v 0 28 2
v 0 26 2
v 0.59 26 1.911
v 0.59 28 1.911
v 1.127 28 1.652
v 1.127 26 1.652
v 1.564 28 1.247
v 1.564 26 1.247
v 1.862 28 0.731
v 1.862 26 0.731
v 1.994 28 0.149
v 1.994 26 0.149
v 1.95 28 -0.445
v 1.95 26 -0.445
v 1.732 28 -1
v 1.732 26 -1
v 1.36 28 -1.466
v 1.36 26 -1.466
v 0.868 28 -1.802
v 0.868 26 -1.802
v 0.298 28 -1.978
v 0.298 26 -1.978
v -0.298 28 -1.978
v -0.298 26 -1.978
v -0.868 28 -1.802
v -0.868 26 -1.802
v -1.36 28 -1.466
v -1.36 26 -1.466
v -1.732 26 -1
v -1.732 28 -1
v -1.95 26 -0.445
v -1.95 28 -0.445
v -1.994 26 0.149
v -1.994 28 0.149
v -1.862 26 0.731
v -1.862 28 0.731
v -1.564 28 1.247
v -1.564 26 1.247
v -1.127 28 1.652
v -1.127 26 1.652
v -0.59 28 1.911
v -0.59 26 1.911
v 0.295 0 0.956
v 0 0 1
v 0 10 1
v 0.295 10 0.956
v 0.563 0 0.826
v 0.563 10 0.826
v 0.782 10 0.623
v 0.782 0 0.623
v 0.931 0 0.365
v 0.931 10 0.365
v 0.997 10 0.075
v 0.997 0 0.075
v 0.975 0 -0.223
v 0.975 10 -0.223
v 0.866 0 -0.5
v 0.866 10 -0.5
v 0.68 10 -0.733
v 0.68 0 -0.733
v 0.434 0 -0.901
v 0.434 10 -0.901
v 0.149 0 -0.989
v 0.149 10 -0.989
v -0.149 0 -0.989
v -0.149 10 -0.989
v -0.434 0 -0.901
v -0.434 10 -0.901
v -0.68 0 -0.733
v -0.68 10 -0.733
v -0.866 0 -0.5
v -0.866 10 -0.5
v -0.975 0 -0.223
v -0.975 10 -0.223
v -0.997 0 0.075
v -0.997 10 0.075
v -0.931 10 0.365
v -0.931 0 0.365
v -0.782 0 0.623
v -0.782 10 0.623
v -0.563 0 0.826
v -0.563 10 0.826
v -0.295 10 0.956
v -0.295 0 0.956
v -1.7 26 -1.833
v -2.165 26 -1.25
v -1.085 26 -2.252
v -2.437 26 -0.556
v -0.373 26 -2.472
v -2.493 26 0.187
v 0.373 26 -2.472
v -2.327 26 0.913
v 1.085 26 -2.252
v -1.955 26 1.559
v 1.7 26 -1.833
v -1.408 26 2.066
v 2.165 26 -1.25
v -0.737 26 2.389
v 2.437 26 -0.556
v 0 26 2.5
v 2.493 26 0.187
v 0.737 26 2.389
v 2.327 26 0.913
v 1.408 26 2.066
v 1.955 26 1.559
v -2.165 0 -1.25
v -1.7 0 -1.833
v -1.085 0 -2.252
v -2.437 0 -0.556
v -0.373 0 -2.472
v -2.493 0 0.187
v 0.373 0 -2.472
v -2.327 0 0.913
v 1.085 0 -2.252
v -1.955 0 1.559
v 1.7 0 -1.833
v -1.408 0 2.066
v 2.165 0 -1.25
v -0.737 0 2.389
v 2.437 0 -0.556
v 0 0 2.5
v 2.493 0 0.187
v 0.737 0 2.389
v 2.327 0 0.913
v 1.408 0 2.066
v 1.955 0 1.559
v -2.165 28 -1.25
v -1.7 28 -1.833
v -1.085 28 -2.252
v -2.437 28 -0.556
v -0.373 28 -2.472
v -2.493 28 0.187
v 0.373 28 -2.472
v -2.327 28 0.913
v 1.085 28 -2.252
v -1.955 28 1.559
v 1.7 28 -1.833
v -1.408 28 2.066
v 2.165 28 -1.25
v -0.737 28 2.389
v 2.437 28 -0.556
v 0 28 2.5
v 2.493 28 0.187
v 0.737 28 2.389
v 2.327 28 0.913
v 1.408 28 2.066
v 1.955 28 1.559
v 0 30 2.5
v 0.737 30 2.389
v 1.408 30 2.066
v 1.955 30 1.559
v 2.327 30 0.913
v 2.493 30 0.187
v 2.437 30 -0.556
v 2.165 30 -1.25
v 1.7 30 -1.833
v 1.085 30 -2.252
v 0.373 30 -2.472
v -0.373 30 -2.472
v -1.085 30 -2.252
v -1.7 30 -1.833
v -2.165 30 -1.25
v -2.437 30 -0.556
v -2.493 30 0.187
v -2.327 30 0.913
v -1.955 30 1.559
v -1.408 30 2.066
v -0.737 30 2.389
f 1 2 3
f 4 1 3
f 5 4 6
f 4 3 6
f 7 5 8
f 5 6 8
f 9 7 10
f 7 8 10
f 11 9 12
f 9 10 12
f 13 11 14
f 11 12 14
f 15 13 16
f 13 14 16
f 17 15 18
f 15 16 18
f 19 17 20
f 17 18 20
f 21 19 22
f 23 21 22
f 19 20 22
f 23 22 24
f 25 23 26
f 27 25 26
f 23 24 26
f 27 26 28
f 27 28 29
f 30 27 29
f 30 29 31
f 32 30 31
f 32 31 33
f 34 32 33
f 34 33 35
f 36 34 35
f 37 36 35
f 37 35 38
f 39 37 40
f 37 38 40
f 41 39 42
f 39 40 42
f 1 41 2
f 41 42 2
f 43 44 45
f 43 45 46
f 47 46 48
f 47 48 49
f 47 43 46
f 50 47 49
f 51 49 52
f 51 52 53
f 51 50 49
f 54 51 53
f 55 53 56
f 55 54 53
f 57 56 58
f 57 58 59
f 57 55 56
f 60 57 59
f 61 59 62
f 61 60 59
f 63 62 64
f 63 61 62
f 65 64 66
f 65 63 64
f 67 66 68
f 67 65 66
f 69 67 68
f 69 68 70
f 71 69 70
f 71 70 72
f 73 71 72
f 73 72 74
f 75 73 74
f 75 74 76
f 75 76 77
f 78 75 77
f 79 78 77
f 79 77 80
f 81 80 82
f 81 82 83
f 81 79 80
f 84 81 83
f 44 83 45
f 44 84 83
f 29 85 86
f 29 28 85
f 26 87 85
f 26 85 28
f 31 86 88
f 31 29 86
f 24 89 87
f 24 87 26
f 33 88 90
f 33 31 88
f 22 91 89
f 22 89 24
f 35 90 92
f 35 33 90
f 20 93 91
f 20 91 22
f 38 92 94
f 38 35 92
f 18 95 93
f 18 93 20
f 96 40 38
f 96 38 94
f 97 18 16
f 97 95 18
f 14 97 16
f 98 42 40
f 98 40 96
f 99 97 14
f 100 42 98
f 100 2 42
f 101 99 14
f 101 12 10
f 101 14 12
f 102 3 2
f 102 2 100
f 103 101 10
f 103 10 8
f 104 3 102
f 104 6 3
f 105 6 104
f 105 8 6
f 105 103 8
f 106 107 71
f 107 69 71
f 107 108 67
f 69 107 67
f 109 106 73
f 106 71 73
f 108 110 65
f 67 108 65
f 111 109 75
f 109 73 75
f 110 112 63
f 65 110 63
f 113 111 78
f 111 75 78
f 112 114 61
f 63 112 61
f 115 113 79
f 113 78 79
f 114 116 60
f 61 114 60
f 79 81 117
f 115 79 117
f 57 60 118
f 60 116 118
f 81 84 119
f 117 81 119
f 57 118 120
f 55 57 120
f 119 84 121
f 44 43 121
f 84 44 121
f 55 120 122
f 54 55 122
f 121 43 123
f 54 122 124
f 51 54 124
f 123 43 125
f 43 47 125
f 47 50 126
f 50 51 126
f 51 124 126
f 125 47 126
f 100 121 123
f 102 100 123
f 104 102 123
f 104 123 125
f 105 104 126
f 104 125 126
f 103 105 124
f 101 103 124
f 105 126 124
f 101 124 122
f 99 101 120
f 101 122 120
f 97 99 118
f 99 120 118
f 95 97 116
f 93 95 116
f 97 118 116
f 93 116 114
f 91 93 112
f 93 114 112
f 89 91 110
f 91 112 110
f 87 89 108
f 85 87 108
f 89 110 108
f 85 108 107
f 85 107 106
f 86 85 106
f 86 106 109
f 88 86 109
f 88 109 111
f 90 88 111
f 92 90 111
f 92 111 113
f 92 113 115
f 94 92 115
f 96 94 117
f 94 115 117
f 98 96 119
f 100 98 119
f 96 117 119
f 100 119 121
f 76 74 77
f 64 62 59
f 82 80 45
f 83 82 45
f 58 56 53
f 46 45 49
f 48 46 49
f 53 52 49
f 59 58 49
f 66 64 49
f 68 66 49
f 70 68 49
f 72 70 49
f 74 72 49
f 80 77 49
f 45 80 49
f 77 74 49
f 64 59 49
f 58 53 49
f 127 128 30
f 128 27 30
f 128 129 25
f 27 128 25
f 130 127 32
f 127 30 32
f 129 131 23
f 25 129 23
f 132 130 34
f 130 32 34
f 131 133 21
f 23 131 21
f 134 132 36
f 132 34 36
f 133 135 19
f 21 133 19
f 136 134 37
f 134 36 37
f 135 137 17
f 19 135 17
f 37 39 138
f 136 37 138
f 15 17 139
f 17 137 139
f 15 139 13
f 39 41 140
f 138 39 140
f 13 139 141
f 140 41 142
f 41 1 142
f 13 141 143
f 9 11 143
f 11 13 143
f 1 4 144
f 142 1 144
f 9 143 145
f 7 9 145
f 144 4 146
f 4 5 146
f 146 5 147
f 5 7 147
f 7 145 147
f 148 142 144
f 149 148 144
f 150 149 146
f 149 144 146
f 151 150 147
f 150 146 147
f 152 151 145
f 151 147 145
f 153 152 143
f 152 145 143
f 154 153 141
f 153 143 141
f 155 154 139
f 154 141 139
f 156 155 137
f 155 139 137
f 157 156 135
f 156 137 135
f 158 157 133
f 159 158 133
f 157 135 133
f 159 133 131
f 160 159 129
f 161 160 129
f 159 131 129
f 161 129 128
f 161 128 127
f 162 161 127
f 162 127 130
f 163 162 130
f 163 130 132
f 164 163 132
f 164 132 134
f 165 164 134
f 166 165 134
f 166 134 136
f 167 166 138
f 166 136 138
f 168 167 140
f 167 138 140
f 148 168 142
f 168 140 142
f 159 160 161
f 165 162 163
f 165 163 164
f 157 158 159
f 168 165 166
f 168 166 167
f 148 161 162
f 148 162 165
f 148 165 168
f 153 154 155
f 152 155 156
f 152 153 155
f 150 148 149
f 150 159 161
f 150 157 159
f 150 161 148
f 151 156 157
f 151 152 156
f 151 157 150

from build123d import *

# Parameters (mm, degrees)
SKETCH1_R           = 2.5
BOSS_EXTRUDE1_DEPTH = 26
SKETCH1_5_R         = 1
CUT_EXTRUDE1_DEPTH  = 10
SKETCH3_R           = 2
BOSS_EXTRUDE2_DEPTH = 2
SKETCH4_R           = 2.5
BOSS_EXTRUDE3_DEPTH = 2


with BuildPart() as part:
    # Sketch1 → Boss-Extrude1 (new body)
    with BuildSketch(Plane(origin=(0, 0, 0), x_dir=(1, 0, 0), z_dir=(0, 1, 0))):
        Circle(SKETCH1_R)
    extrude(amount=BOSS_EXTRUDE1_DEPTH)

    # Sketch1<5> → Cut-Extrude1 (cut)
    with BuildSketch(Plane(origin=(0, 0, 0), x_dir=(1, 0, 0), z_dir=(0, 1, 0))):
        Circle(SKETCH1_5_R)
    extrude(amount=CUT_EXTRUDE1_DEPTH, mode=Mode.SUBTRACT)

    # Sketch3 → Boss-Extrude2 (add)
    with BuildSketch(Plane(origin=(0, 26, 0), x_dir=(1, 0, 0), z_dir=(0, 1, 0))):
        Circle(SKETCH3_R)
    extrude(amount=BOSS_EXTRUDE2_DEPTH)

    # Sketch4 → Boss-Extrude3 (add)
    with BuildSketch(Plane(origin=(0, 28, 0), x_dir=(1, 0, 0), z_dir=(0, 1, 0))):
        Circle(SKETCH4_R)
    extrude(amount=BOSS_EXTRUDE3_DEPTH)


solid = part.part
